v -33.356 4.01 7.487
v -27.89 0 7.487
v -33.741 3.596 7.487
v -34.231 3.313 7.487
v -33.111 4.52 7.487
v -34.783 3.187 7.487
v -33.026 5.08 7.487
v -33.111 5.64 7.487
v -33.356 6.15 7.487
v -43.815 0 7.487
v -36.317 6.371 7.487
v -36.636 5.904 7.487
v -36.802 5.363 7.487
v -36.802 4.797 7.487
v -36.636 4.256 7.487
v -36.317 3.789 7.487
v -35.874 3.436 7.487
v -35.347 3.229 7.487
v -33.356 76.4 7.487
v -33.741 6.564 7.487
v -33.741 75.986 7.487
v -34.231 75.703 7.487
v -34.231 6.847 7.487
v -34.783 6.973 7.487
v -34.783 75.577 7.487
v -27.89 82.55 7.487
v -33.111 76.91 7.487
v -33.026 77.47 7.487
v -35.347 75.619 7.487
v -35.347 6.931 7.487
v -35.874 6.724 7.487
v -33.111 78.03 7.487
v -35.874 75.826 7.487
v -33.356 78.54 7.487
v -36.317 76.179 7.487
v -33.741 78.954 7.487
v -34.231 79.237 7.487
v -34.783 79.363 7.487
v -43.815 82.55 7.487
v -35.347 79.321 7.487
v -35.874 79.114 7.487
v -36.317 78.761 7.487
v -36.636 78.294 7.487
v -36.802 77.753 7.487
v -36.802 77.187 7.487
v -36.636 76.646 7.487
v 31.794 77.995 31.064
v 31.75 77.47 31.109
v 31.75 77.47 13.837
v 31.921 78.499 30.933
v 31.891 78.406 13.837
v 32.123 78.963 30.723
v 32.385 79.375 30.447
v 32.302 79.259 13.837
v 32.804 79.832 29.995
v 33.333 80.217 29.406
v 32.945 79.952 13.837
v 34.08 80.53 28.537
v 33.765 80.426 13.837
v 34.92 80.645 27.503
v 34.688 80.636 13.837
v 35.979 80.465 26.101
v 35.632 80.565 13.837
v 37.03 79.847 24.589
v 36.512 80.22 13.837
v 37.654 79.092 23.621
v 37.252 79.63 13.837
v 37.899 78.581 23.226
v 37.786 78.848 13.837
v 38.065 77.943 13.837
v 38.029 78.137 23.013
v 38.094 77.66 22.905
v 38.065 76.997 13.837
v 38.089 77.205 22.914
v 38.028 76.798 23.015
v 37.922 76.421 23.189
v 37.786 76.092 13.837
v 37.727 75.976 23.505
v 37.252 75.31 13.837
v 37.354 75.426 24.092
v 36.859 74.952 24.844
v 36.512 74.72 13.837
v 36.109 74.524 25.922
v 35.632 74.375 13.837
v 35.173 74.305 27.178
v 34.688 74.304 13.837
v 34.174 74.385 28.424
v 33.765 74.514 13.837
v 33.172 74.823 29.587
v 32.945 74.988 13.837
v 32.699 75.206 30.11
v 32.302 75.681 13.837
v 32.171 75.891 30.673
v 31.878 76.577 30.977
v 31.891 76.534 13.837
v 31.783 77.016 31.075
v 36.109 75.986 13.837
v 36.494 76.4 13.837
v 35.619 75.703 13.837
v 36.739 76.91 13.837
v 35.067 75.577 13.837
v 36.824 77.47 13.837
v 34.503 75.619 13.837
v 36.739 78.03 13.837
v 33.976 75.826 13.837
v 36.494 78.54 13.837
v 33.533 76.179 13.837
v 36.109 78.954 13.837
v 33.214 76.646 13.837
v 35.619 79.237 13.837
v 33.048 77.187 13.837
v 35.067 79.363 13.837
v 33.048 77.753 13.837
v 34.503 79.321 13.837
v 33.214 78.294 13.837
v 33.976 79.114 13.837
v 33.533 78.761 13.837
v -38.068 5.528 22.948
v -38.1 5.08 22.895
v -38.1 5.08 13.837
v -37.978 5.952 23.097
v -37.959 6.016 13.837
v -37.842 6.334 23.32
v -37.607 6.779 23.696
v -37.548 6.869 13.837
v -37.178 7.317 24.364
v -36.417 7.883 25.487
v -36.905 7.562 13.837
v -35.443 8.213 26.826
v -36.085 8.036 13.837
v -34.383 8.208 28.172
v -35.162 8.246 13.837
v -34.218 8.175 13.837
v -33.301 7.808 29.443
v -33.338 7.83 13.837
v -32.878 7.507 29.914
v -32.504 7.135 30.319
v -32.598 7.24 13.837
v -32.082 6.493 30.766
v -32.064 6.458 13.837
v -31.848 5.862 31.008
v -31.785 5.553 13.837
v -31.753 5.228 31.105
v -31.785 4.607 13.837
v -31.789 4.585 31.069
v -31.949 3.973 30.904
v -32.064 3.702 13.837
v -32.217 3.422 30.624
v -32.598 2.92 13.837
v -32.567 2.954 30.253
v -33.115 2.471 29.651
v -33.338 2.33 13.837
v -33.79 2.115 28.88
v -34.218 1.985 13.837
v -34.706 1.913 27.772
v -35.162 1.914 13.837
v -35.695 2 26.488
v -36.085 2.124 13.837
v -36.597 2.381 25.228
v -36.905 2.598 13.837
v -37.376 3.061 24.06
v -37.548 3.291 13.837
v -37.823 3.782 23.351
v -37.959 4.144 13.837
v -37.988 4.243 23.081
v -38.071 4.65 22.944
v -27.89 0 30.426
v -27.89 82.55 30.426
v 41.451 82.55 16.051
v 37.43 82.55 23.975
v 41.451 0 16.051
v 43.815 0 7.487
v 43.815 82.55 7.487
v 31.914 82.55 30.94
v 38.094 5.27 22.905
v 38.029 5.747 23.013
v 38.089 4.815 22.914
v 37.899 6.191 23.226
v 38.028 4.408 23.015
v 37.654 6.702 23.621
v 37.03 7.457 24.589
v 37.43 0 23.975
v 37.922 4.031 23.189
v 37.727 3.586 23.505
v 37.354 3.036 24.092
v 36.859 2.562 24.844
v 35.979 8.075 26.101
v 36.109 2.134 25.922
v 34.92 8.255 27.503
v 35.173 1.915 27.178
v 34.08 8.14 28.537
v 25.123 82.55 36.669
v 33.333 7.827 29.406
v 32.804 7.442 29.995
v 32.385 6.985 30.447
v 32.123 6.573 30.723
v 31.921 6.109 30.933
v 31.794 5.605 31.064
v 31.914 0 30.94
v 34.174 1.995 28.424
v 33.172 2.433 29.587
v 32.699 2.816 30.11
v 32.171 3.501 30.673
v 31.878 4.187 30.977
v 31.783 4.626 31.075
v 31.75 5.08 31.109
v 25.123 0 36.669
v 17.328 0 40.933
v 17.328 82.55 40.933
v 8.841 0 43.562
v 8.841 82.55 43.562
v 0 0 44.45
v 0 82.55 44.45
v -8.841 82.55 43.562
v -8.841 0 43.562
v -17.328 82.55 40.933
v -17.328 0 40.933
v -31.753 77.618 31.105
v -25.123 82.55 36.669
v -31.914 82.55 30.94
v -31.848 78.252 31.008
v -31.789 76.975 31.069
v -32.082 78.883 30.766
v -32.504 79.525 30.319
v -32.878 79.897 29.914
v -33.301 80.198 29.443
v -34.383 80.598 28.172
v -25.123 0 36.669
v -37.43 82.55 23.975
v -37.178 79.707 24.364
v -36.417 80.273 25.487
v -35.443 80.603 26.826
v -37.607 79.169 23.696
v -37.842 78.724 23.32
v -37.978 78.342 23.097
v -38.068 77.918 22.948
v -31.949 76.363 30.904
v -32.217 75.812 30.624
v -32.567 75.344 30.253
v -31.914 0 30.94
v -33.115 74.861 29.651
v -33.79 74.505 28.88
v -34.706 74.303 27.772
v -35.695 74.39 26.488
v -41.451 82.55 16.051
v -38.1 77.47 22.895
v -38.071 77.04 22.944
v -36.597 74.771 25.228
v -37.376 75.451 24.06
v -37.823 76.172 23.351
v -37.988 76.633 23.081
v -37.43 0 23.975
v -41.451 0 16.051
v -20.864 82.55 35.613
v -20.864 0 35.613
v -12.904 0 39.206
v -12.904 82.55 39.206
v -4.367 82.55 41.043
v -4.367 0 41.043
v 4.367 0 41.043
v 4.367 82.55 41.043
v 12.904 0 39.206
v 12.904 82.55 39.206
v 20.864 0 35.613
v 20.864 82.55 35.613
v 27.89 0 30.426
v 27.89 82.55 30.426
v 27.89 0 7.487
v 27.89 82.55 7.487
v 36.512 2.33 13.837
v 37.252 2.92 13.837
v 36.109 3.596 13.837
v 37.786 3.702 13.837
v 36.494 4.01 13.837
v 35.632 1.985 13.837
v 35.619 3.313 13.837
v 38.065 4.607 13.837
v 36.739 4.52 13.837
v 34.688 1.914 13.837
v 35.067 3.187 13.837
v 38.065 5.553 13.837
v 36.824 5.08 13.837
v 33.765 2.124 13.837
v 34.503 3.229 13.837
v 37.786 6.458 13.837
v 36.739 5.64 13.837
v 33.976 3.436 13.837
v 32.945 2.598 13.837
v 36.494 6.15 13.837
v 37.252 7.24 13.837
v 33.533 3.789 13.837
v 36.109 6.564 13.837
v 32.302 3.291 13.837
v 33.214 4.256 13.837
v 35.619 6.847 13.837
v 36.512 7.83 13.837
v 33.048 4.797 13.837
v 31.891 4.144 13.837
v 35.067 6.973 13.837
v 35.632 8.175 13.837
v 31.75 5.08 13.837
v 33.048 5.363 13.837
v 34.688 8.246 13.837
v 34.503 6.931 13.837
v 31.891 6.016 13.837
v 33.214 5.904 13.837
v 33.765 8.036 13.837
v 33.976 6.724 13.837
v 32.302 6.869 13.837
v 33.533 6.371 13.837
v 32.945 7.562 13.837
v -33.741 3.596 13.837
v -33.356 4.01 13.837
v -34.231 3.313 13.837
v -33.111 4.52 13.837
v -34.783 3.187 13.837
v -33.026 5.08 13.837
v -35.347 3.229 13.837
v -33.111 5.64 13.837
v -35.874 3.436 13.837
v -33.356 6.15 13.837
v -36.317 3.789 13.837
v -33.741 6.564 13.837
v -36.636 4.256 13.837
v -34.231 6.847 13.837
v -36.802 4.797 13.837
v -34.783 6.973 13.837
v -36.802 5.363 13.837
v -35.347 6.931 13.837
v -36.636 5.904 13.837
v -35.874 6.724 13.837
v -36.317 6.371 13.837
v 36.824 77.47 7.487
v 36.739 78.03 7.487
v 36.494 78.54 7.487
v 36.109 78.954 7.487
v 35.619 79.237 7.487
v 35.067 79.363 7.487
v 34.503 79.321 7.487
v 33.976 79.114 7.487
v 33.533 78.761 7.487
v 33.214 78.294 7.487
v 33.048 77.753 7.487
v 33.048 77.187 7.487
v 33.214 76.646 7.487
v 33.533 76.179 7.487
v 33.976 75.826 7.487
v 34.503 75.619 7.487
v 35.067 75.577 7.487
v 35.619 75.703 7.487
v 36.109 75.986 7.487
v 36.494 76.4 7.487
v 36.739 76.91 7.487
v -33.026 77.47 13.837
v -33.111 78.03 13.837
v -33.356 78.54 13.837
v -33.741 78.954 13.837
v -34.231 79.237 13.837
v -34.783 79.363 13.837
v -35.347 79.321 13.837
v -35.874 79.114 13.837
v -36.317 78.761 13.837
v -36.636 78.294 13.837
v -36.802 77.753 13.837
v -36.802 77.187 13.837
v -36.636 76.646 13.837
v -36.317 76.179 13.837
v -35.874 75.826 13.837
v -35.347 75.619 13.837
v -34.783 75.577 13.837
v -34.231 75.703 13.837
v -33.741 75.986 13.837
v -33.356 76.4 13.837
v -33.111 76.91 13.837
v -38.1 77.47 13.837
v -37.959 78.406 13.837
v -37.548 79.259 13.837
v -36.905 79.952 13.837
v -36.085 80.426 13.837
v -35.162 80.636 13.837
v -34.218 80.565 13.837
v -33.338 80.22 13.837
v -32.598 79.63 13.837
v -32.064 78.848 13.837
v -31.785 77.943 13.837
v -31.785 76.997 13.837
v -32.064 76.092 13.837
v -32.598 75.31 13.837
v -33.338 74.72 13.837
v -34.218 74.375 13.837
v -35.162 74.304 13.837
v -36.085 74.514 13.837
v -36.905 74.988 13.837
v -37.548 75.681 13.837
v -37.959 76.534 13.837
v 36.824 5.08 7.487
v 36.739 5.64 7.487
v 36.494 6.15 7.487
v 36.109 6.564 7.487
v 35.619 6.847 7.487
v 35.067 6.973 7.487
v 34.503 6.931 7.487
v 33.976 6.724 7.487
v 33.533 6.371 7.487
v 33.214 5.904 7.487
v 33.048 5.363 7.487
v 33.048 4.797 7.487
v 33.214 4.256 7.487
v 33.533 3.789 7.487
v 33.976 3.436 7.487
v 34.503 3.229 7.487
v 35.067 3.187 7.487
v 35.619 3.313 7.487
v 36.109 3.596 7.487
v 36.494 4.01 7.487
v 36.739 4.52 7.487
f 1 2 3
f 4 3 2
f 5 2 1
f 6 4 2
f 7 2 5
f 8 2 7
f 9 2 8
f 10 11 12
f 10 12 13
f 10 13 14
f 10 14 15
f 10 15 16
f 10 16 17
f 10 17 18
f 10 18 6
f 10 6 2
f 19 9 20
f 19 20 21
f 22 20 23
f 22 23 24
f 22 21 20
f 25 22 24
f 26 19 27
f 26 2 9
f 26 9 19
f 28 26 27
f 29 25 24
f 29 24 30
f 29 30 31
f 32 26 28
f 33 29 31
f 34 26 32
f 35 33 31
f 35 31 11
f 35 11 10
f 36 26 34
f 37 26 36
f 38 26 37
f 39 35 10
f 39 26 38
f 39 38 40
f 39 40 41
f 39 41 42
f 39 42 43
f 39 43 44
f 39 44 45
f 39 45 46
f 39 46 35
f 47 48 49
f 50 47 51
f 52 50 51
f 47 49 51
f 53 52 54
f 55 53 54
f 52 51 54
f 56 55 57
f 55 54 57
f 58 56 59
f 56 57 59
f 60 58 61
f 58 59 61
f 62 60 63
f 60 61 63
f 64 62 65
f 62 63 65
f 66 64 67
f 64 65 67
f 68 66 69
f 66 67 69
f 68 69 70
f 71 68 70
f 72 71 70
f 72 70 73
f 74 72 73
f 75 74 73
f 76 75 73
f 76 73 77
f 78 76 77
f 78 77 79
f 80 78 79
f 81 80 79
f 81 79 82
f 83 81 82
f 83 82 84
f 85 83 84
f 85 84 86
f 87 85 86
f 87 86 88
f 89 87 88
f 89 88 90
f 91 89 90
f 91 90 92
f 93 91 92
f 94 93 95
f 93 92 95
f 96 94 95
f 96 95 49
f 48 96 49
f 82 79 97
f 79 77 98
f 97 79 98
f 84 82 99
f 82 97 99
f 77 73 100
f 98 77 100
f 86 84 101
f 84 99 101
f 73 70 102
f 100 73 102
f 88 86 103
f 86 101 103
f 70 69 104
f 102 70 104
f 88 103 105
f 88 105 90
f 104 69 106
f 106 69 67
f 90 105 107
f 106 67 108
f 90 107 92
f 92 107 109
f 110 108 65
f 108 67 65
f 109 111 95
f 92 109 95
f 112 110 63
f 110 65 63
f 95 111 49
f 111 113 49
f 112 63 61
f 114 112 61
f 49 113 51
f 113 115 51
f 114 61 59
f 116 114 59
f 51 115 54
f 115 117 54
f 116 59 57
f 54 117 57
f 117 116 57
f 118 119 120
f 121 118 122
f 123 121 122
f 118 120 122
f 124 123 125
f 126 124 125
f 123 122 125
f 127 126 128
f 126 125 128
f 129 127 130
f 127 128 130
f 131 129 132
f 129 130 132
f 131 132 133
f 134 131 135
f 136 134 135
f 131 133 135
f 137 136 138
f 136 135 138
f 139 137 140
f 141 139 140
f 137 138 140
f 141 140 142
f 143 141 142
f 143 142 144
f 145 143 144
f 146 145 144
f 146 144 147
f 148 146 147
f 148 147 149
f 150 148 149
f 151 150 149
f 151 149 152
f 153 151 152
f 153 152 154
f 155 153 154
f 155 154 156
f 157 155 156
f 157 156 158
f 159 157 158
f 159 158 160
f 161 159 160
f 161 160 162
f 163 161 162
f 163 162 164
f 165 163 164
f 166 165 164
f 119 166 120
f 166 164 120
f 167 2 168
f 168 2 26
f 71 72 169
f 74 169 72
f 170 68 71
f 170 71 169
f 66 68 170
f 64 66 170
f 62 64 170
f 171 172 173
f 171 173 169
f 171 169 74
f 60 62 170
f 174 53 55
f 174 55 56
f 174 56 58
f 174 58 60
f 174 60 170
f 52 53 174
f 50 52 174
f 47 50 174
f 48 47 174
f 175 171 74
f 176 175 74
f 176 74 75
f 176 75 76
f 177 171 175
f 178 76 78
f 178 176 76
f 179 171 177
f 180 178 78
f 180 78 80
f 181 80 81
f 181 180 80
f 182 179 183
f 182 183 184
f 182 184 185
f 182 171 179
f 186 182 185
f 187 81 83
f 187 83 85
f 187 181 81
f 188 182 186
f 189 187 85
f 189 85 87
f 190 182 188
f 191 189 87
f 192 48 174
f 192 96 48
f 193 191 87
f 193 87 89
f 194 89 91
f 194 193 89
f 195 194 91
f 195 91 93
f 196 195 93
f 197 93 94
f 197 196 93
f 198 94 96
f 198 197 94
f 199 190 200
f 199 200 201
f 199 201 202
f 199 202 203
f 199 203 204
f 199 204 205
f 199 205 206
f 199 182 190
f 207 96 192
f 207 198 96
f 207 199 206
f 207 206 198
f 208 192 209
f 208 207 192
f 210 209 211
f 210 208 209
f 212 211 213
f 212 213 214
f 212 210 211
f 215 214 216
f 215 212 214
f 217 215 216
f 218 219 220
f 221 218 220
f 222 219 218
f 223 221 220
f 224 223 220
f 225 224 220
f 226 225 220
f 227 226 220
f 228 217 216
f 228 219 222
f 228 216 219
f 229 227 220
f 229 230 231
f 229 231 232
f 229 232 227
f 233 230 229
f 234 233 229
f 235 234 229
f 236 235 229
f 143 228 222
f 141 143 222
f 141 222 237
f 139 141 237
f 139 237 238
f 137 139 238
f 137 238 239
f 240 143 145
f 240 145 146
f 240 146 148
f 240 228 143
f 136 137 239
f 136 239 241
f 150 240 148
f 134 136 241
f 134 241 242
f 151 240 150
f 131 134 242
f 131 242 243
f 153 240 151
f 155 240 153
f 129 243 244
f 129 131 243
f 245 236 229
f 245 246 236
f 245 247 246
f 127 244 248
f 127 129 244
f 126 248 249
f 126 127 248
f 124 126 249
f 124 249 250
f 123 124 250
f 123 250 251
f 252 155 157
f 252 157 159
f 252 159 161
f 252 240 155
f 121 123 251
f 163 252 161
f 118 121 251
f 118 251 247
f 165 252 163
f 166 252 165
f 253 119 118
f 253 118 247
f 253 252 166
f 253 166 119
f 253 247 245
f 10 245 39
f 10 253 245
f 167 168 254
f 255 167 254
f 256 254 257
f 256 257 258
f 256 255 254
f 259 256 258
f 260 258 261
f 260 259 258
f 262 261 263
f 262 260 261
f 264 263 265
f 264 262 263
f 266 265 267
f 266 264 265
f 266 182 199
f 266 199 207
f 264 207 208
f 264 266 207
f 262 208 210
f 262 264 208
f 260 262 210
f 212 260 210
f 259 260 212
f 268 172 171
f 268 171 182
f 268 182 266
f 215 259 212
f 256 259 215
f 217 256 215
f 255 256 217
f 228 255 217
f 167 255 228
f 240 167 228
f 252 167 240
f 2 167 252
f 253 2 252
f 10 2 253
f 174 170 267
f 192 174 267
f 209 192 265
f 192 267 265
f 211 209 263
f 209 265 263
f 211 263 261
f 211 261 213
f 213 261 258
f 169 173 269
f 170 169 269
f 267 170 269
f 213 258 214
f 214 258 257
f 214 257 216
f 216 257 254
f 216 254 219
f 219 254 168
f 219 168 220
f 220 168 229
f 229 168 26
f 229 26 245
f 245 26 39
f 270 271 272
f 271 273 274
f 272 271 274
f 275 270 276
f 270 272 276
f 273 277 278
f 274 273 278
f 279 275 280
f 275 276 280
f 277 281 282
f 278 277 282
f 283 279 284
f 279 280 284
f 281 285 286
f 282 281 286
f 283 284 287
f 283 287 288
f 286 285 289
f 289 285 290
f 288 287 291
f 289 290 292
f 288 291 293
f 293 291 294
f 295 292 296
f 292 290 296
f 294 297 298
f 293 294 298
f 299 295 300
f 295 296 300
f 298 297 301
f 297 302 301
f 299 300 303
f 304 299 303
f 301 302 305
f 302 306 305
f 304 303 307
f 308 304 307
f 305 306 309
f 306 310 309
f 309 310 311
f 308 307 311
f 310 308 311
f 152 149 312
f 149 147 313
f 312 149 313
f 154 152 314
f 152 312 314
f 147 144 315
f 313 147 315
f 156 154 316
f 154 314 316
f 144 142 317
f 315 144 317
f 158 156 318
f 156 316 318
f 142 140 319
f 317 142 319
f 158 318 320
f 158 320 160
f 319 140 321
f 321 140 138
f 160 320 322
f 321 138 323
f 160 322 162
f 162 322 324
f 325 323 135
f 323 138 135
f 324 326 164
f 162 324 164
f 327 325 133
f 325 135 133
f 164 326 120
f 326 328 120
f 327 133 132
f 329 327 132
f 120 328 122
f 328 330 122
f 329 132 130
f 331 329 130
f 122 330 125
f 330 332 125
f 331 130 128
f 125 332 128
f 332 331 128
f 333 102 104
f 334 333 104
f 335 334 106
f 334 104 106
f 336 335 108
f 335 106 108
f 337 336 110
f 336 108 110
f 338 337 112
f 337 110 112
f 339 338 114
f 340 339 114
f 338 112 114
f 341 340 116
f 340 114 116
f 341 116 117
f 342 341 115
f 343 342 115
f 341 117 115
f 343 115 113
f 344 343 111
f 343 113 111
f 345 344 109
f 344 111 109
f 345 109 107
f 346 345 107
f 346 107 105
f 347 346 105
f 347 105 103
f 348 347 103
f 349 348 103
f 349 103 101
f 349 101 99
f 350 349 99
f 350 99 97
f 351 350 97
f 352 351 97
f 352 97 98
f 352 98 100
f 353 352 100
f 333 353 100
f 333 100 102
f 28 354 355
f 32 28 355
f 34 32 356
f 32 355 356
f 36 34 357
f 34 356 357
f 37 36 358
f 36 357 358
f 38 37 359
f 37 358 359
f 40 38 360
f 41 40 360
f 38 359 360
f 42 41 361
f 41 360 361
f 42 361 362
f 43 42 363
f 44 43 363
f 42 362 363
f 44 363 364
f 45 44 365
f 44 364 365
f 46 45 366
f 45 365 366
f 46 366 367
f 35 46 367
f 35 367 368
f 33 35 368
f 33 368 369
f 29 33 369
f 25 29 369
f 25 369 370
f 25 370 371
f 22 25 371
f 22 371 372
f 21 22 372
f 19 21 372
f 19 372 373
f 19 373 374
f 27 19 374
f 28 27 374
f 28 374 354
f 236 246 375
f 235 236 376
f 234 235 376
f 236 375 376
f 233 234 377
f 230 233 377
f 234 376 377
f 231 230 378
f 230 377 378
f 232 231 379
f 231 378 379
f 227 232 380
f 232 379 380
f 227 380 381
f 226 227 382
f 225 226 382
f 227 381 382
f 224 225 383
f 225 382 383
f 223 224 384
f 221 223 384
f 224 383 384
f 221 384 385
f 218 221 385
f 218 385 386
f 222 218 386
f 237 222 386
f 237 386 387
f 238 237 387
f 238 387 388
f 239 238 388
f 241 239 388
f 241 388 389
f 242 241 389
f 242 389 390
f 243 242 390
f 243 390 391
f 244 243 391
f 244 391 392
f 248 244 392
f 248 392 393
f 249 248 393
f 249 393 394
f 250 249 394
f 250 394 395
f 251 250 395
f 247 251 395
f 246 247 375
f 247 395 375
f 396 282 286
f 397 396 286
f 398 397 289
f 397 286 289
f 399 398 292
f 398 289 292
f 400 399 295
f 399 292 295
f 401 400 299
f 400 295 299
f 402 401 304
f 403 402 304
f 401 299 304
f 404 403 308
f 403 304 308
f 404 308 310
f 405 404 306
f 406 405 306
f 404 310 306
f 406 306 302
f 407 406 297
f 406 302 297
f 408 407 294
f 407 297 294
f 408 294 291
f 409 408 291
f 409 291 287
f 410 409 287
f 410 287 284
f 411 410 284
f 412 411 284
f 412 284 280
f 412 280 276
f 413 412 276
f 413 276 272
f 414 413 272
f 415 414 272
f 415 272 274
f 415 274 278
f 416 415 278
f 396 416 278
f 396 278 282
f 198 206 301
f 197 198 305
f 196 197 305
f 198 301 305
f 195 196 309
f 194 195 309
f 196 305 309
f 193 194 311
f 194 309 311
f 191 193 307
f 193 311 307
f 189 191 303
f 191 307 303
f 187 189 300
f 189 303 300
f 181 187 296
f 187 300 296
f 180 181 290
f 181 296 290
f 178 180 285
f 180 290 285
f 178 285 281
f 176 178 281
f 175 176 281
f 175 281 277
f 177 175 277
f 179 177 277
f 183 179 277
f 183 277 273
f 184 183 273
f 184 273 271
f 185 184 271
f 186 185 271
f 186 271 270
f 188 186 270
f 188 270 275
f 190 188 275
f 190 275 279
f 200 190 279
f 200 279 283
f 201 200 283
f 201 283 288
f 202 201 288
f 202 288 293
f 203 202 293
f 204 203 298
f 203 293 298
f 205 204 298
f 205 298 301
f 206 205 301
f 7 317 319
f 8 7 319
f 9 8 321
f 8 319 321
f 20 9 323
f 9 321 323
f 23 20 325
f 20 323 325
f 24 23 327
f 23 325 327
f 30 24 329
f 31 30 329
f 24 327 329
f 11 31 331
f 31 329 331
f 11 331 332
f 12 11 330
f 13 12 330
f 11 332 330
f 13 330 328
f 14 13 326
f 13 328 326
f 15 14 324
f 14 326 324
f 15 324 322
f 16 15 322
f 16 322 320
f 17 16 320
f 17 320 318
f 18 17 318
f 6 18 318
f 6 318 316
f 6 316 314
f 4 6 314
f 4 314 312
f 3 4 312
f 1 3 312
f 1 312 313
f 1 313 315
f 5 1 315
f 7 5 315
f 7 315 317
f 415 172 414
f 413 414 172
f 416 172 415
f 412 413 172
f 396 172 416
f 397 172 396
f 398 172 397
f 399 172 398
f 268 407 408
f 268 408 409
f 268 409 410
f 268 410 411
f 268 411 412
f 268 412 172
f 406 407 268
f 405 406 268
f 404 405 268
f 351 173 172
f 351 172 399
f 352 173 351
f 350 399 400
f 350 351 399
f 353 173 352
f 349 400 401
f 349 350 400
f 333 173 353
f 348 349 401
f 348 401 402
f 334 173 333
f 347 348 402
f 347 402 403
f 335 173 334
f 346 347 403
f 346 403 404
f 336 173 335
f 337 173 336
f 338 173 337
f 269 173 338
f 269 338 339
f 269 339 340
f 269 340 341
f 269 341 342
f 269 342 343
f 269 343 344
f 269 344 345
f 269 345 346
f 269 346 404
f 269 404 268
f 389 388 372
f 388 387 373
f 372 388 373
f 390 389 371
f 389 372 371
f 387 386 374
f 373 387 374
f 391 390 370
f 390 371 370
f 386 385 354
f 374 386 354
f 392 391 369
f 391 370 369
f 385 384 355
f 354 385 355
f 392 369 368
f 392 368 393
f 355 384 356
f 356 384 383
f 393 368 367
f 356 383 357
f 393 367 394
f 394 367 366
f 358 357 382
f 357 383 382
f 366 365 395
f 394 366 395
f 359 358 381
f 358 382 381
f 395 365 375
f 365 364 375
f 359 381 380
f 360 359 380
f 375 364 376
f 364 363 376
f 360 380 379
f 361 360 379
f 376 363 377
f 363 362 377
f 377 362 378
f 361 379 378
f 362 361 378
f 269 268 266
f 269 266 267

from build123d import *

# Parameters (mm, degrees)
BOSS_EXTRUDE1_DEPTH   = 82.55
BOSS_EXTRUDE2_REACH   = 38.963
SKETCH4_W             = 12.7
SKETCH4_H             = 82.55
F_6_CLEARANCE_HOLE1_D = 3.7973
SKETCH7_R             = 3.175
CUT_EXTRUDE1_DEPTH    = 31.613460512


with BuildPart() as part:
    # Sketch3 → Boss-Extrude1 (new body)
    with BuildSketch(Plane(origin=(0, 0, 0), x_dir=(1, 0, 0), z_dir=(0, 1, 0))):
        with BuildLine():
            Line((-43.815, -7.486539588), (-40.590360309, -7.486539588))
            ThreePointArc((-40.590360309, -7.486539588), (0, -41.275), (40.590360309, -7.486539588))
            Line((40.590360309, -7.486539588), (43.815, -7.486539588))
            ThreePointArc((43.815, -7.486539588), (0, -44.45), (-43.815, -7.486539588))
        make_face()
    extrude(amount=BOSS_EXTRUDE1_DEPTH)

    # Sketch4 → Boss-Extrude2 (add, up to next)
    with BuildSketch(Plane(origin=(0, 0, 7.486539588), x_dir=(-1, 0, 0), z_dir=(0, 0, -1)), mode=Mode.PRIVATE) as boss_extrude2_sk1:
        with Locations((-34.240360309, 41.275)):
            Rectangle(SKETCH4_W, SKETCH4_H)
    boss_extrude2_tool1 = extrude(boss_extrude2_sk1.sketch, amount=-BOSS_EXTRUDE2_REACH, mode=Mode.PRIVATE) - part.part
    add(boss_extrude2_tool1.solids().sort_by_distance((34.24036, 41.275, 7.48654))[0])
    # Sketch4 → Boss-Extrude2 (add, up to next)
    with BuildSketch(Plane(origin=(0, 0, 7.486539588), x_dir=(-1, 0, 0), z_dir=(0, 0, -1)), mode=Mode.PRIVATE) as boss_extrude2_sk2:
        with Locations((34.240360309, 41.275)):
            Rectangle(SKETCH4_W, SKETCH4_H)
    boss_extrude2_tool2 = extrude(boss_extrude2_sk2.sketch, amount=-BOSS_EXTRUDE2_REACH, mode=Mode.PRIVATE) - part.part
    add(boss_extrude2_tool2.solids().sort_by_distance((-34.24036, 41.275, 7.48654))[0])

    # #6 Clearance Hole1 (through all)
    with Locations(Plane(origin=(0, 0, 7.486539588), x_dir=(-1, 0, 0), z_dir=(0, 0, -1))):
        with Locations((-34.925, 77.47), (-34.925, 5.08), (34.925, 77.47), (34.925, 5.08)):
            Hole(F_6_CLEARANCE_HOLE1_D / 2)

    # Sketch7 → Cut-Extrude1 (cut, through all)
    with BuildSketch(Plane(origin=(0, 0, 13.836539588), x_dir=(-1, 0, 0), z_dir=(0, 0, -1))):
        with Locations((-34.925, 5.08)):
            Circle(SKETCH7_R)
        with Locations((34.925, 5.08)):
            Circle(SKETCH7_R)
        with Locations((34.925, 77.47)):
            Circle(SKETCH7_R)
        with Locations((-34.925, 77.47)):
            Circle(SKETCH7_R)
    extrude(amount=-CUT_EXTRUDE1_DEPTH, mode=Mode.SUBTRACT)


solid = part.part
